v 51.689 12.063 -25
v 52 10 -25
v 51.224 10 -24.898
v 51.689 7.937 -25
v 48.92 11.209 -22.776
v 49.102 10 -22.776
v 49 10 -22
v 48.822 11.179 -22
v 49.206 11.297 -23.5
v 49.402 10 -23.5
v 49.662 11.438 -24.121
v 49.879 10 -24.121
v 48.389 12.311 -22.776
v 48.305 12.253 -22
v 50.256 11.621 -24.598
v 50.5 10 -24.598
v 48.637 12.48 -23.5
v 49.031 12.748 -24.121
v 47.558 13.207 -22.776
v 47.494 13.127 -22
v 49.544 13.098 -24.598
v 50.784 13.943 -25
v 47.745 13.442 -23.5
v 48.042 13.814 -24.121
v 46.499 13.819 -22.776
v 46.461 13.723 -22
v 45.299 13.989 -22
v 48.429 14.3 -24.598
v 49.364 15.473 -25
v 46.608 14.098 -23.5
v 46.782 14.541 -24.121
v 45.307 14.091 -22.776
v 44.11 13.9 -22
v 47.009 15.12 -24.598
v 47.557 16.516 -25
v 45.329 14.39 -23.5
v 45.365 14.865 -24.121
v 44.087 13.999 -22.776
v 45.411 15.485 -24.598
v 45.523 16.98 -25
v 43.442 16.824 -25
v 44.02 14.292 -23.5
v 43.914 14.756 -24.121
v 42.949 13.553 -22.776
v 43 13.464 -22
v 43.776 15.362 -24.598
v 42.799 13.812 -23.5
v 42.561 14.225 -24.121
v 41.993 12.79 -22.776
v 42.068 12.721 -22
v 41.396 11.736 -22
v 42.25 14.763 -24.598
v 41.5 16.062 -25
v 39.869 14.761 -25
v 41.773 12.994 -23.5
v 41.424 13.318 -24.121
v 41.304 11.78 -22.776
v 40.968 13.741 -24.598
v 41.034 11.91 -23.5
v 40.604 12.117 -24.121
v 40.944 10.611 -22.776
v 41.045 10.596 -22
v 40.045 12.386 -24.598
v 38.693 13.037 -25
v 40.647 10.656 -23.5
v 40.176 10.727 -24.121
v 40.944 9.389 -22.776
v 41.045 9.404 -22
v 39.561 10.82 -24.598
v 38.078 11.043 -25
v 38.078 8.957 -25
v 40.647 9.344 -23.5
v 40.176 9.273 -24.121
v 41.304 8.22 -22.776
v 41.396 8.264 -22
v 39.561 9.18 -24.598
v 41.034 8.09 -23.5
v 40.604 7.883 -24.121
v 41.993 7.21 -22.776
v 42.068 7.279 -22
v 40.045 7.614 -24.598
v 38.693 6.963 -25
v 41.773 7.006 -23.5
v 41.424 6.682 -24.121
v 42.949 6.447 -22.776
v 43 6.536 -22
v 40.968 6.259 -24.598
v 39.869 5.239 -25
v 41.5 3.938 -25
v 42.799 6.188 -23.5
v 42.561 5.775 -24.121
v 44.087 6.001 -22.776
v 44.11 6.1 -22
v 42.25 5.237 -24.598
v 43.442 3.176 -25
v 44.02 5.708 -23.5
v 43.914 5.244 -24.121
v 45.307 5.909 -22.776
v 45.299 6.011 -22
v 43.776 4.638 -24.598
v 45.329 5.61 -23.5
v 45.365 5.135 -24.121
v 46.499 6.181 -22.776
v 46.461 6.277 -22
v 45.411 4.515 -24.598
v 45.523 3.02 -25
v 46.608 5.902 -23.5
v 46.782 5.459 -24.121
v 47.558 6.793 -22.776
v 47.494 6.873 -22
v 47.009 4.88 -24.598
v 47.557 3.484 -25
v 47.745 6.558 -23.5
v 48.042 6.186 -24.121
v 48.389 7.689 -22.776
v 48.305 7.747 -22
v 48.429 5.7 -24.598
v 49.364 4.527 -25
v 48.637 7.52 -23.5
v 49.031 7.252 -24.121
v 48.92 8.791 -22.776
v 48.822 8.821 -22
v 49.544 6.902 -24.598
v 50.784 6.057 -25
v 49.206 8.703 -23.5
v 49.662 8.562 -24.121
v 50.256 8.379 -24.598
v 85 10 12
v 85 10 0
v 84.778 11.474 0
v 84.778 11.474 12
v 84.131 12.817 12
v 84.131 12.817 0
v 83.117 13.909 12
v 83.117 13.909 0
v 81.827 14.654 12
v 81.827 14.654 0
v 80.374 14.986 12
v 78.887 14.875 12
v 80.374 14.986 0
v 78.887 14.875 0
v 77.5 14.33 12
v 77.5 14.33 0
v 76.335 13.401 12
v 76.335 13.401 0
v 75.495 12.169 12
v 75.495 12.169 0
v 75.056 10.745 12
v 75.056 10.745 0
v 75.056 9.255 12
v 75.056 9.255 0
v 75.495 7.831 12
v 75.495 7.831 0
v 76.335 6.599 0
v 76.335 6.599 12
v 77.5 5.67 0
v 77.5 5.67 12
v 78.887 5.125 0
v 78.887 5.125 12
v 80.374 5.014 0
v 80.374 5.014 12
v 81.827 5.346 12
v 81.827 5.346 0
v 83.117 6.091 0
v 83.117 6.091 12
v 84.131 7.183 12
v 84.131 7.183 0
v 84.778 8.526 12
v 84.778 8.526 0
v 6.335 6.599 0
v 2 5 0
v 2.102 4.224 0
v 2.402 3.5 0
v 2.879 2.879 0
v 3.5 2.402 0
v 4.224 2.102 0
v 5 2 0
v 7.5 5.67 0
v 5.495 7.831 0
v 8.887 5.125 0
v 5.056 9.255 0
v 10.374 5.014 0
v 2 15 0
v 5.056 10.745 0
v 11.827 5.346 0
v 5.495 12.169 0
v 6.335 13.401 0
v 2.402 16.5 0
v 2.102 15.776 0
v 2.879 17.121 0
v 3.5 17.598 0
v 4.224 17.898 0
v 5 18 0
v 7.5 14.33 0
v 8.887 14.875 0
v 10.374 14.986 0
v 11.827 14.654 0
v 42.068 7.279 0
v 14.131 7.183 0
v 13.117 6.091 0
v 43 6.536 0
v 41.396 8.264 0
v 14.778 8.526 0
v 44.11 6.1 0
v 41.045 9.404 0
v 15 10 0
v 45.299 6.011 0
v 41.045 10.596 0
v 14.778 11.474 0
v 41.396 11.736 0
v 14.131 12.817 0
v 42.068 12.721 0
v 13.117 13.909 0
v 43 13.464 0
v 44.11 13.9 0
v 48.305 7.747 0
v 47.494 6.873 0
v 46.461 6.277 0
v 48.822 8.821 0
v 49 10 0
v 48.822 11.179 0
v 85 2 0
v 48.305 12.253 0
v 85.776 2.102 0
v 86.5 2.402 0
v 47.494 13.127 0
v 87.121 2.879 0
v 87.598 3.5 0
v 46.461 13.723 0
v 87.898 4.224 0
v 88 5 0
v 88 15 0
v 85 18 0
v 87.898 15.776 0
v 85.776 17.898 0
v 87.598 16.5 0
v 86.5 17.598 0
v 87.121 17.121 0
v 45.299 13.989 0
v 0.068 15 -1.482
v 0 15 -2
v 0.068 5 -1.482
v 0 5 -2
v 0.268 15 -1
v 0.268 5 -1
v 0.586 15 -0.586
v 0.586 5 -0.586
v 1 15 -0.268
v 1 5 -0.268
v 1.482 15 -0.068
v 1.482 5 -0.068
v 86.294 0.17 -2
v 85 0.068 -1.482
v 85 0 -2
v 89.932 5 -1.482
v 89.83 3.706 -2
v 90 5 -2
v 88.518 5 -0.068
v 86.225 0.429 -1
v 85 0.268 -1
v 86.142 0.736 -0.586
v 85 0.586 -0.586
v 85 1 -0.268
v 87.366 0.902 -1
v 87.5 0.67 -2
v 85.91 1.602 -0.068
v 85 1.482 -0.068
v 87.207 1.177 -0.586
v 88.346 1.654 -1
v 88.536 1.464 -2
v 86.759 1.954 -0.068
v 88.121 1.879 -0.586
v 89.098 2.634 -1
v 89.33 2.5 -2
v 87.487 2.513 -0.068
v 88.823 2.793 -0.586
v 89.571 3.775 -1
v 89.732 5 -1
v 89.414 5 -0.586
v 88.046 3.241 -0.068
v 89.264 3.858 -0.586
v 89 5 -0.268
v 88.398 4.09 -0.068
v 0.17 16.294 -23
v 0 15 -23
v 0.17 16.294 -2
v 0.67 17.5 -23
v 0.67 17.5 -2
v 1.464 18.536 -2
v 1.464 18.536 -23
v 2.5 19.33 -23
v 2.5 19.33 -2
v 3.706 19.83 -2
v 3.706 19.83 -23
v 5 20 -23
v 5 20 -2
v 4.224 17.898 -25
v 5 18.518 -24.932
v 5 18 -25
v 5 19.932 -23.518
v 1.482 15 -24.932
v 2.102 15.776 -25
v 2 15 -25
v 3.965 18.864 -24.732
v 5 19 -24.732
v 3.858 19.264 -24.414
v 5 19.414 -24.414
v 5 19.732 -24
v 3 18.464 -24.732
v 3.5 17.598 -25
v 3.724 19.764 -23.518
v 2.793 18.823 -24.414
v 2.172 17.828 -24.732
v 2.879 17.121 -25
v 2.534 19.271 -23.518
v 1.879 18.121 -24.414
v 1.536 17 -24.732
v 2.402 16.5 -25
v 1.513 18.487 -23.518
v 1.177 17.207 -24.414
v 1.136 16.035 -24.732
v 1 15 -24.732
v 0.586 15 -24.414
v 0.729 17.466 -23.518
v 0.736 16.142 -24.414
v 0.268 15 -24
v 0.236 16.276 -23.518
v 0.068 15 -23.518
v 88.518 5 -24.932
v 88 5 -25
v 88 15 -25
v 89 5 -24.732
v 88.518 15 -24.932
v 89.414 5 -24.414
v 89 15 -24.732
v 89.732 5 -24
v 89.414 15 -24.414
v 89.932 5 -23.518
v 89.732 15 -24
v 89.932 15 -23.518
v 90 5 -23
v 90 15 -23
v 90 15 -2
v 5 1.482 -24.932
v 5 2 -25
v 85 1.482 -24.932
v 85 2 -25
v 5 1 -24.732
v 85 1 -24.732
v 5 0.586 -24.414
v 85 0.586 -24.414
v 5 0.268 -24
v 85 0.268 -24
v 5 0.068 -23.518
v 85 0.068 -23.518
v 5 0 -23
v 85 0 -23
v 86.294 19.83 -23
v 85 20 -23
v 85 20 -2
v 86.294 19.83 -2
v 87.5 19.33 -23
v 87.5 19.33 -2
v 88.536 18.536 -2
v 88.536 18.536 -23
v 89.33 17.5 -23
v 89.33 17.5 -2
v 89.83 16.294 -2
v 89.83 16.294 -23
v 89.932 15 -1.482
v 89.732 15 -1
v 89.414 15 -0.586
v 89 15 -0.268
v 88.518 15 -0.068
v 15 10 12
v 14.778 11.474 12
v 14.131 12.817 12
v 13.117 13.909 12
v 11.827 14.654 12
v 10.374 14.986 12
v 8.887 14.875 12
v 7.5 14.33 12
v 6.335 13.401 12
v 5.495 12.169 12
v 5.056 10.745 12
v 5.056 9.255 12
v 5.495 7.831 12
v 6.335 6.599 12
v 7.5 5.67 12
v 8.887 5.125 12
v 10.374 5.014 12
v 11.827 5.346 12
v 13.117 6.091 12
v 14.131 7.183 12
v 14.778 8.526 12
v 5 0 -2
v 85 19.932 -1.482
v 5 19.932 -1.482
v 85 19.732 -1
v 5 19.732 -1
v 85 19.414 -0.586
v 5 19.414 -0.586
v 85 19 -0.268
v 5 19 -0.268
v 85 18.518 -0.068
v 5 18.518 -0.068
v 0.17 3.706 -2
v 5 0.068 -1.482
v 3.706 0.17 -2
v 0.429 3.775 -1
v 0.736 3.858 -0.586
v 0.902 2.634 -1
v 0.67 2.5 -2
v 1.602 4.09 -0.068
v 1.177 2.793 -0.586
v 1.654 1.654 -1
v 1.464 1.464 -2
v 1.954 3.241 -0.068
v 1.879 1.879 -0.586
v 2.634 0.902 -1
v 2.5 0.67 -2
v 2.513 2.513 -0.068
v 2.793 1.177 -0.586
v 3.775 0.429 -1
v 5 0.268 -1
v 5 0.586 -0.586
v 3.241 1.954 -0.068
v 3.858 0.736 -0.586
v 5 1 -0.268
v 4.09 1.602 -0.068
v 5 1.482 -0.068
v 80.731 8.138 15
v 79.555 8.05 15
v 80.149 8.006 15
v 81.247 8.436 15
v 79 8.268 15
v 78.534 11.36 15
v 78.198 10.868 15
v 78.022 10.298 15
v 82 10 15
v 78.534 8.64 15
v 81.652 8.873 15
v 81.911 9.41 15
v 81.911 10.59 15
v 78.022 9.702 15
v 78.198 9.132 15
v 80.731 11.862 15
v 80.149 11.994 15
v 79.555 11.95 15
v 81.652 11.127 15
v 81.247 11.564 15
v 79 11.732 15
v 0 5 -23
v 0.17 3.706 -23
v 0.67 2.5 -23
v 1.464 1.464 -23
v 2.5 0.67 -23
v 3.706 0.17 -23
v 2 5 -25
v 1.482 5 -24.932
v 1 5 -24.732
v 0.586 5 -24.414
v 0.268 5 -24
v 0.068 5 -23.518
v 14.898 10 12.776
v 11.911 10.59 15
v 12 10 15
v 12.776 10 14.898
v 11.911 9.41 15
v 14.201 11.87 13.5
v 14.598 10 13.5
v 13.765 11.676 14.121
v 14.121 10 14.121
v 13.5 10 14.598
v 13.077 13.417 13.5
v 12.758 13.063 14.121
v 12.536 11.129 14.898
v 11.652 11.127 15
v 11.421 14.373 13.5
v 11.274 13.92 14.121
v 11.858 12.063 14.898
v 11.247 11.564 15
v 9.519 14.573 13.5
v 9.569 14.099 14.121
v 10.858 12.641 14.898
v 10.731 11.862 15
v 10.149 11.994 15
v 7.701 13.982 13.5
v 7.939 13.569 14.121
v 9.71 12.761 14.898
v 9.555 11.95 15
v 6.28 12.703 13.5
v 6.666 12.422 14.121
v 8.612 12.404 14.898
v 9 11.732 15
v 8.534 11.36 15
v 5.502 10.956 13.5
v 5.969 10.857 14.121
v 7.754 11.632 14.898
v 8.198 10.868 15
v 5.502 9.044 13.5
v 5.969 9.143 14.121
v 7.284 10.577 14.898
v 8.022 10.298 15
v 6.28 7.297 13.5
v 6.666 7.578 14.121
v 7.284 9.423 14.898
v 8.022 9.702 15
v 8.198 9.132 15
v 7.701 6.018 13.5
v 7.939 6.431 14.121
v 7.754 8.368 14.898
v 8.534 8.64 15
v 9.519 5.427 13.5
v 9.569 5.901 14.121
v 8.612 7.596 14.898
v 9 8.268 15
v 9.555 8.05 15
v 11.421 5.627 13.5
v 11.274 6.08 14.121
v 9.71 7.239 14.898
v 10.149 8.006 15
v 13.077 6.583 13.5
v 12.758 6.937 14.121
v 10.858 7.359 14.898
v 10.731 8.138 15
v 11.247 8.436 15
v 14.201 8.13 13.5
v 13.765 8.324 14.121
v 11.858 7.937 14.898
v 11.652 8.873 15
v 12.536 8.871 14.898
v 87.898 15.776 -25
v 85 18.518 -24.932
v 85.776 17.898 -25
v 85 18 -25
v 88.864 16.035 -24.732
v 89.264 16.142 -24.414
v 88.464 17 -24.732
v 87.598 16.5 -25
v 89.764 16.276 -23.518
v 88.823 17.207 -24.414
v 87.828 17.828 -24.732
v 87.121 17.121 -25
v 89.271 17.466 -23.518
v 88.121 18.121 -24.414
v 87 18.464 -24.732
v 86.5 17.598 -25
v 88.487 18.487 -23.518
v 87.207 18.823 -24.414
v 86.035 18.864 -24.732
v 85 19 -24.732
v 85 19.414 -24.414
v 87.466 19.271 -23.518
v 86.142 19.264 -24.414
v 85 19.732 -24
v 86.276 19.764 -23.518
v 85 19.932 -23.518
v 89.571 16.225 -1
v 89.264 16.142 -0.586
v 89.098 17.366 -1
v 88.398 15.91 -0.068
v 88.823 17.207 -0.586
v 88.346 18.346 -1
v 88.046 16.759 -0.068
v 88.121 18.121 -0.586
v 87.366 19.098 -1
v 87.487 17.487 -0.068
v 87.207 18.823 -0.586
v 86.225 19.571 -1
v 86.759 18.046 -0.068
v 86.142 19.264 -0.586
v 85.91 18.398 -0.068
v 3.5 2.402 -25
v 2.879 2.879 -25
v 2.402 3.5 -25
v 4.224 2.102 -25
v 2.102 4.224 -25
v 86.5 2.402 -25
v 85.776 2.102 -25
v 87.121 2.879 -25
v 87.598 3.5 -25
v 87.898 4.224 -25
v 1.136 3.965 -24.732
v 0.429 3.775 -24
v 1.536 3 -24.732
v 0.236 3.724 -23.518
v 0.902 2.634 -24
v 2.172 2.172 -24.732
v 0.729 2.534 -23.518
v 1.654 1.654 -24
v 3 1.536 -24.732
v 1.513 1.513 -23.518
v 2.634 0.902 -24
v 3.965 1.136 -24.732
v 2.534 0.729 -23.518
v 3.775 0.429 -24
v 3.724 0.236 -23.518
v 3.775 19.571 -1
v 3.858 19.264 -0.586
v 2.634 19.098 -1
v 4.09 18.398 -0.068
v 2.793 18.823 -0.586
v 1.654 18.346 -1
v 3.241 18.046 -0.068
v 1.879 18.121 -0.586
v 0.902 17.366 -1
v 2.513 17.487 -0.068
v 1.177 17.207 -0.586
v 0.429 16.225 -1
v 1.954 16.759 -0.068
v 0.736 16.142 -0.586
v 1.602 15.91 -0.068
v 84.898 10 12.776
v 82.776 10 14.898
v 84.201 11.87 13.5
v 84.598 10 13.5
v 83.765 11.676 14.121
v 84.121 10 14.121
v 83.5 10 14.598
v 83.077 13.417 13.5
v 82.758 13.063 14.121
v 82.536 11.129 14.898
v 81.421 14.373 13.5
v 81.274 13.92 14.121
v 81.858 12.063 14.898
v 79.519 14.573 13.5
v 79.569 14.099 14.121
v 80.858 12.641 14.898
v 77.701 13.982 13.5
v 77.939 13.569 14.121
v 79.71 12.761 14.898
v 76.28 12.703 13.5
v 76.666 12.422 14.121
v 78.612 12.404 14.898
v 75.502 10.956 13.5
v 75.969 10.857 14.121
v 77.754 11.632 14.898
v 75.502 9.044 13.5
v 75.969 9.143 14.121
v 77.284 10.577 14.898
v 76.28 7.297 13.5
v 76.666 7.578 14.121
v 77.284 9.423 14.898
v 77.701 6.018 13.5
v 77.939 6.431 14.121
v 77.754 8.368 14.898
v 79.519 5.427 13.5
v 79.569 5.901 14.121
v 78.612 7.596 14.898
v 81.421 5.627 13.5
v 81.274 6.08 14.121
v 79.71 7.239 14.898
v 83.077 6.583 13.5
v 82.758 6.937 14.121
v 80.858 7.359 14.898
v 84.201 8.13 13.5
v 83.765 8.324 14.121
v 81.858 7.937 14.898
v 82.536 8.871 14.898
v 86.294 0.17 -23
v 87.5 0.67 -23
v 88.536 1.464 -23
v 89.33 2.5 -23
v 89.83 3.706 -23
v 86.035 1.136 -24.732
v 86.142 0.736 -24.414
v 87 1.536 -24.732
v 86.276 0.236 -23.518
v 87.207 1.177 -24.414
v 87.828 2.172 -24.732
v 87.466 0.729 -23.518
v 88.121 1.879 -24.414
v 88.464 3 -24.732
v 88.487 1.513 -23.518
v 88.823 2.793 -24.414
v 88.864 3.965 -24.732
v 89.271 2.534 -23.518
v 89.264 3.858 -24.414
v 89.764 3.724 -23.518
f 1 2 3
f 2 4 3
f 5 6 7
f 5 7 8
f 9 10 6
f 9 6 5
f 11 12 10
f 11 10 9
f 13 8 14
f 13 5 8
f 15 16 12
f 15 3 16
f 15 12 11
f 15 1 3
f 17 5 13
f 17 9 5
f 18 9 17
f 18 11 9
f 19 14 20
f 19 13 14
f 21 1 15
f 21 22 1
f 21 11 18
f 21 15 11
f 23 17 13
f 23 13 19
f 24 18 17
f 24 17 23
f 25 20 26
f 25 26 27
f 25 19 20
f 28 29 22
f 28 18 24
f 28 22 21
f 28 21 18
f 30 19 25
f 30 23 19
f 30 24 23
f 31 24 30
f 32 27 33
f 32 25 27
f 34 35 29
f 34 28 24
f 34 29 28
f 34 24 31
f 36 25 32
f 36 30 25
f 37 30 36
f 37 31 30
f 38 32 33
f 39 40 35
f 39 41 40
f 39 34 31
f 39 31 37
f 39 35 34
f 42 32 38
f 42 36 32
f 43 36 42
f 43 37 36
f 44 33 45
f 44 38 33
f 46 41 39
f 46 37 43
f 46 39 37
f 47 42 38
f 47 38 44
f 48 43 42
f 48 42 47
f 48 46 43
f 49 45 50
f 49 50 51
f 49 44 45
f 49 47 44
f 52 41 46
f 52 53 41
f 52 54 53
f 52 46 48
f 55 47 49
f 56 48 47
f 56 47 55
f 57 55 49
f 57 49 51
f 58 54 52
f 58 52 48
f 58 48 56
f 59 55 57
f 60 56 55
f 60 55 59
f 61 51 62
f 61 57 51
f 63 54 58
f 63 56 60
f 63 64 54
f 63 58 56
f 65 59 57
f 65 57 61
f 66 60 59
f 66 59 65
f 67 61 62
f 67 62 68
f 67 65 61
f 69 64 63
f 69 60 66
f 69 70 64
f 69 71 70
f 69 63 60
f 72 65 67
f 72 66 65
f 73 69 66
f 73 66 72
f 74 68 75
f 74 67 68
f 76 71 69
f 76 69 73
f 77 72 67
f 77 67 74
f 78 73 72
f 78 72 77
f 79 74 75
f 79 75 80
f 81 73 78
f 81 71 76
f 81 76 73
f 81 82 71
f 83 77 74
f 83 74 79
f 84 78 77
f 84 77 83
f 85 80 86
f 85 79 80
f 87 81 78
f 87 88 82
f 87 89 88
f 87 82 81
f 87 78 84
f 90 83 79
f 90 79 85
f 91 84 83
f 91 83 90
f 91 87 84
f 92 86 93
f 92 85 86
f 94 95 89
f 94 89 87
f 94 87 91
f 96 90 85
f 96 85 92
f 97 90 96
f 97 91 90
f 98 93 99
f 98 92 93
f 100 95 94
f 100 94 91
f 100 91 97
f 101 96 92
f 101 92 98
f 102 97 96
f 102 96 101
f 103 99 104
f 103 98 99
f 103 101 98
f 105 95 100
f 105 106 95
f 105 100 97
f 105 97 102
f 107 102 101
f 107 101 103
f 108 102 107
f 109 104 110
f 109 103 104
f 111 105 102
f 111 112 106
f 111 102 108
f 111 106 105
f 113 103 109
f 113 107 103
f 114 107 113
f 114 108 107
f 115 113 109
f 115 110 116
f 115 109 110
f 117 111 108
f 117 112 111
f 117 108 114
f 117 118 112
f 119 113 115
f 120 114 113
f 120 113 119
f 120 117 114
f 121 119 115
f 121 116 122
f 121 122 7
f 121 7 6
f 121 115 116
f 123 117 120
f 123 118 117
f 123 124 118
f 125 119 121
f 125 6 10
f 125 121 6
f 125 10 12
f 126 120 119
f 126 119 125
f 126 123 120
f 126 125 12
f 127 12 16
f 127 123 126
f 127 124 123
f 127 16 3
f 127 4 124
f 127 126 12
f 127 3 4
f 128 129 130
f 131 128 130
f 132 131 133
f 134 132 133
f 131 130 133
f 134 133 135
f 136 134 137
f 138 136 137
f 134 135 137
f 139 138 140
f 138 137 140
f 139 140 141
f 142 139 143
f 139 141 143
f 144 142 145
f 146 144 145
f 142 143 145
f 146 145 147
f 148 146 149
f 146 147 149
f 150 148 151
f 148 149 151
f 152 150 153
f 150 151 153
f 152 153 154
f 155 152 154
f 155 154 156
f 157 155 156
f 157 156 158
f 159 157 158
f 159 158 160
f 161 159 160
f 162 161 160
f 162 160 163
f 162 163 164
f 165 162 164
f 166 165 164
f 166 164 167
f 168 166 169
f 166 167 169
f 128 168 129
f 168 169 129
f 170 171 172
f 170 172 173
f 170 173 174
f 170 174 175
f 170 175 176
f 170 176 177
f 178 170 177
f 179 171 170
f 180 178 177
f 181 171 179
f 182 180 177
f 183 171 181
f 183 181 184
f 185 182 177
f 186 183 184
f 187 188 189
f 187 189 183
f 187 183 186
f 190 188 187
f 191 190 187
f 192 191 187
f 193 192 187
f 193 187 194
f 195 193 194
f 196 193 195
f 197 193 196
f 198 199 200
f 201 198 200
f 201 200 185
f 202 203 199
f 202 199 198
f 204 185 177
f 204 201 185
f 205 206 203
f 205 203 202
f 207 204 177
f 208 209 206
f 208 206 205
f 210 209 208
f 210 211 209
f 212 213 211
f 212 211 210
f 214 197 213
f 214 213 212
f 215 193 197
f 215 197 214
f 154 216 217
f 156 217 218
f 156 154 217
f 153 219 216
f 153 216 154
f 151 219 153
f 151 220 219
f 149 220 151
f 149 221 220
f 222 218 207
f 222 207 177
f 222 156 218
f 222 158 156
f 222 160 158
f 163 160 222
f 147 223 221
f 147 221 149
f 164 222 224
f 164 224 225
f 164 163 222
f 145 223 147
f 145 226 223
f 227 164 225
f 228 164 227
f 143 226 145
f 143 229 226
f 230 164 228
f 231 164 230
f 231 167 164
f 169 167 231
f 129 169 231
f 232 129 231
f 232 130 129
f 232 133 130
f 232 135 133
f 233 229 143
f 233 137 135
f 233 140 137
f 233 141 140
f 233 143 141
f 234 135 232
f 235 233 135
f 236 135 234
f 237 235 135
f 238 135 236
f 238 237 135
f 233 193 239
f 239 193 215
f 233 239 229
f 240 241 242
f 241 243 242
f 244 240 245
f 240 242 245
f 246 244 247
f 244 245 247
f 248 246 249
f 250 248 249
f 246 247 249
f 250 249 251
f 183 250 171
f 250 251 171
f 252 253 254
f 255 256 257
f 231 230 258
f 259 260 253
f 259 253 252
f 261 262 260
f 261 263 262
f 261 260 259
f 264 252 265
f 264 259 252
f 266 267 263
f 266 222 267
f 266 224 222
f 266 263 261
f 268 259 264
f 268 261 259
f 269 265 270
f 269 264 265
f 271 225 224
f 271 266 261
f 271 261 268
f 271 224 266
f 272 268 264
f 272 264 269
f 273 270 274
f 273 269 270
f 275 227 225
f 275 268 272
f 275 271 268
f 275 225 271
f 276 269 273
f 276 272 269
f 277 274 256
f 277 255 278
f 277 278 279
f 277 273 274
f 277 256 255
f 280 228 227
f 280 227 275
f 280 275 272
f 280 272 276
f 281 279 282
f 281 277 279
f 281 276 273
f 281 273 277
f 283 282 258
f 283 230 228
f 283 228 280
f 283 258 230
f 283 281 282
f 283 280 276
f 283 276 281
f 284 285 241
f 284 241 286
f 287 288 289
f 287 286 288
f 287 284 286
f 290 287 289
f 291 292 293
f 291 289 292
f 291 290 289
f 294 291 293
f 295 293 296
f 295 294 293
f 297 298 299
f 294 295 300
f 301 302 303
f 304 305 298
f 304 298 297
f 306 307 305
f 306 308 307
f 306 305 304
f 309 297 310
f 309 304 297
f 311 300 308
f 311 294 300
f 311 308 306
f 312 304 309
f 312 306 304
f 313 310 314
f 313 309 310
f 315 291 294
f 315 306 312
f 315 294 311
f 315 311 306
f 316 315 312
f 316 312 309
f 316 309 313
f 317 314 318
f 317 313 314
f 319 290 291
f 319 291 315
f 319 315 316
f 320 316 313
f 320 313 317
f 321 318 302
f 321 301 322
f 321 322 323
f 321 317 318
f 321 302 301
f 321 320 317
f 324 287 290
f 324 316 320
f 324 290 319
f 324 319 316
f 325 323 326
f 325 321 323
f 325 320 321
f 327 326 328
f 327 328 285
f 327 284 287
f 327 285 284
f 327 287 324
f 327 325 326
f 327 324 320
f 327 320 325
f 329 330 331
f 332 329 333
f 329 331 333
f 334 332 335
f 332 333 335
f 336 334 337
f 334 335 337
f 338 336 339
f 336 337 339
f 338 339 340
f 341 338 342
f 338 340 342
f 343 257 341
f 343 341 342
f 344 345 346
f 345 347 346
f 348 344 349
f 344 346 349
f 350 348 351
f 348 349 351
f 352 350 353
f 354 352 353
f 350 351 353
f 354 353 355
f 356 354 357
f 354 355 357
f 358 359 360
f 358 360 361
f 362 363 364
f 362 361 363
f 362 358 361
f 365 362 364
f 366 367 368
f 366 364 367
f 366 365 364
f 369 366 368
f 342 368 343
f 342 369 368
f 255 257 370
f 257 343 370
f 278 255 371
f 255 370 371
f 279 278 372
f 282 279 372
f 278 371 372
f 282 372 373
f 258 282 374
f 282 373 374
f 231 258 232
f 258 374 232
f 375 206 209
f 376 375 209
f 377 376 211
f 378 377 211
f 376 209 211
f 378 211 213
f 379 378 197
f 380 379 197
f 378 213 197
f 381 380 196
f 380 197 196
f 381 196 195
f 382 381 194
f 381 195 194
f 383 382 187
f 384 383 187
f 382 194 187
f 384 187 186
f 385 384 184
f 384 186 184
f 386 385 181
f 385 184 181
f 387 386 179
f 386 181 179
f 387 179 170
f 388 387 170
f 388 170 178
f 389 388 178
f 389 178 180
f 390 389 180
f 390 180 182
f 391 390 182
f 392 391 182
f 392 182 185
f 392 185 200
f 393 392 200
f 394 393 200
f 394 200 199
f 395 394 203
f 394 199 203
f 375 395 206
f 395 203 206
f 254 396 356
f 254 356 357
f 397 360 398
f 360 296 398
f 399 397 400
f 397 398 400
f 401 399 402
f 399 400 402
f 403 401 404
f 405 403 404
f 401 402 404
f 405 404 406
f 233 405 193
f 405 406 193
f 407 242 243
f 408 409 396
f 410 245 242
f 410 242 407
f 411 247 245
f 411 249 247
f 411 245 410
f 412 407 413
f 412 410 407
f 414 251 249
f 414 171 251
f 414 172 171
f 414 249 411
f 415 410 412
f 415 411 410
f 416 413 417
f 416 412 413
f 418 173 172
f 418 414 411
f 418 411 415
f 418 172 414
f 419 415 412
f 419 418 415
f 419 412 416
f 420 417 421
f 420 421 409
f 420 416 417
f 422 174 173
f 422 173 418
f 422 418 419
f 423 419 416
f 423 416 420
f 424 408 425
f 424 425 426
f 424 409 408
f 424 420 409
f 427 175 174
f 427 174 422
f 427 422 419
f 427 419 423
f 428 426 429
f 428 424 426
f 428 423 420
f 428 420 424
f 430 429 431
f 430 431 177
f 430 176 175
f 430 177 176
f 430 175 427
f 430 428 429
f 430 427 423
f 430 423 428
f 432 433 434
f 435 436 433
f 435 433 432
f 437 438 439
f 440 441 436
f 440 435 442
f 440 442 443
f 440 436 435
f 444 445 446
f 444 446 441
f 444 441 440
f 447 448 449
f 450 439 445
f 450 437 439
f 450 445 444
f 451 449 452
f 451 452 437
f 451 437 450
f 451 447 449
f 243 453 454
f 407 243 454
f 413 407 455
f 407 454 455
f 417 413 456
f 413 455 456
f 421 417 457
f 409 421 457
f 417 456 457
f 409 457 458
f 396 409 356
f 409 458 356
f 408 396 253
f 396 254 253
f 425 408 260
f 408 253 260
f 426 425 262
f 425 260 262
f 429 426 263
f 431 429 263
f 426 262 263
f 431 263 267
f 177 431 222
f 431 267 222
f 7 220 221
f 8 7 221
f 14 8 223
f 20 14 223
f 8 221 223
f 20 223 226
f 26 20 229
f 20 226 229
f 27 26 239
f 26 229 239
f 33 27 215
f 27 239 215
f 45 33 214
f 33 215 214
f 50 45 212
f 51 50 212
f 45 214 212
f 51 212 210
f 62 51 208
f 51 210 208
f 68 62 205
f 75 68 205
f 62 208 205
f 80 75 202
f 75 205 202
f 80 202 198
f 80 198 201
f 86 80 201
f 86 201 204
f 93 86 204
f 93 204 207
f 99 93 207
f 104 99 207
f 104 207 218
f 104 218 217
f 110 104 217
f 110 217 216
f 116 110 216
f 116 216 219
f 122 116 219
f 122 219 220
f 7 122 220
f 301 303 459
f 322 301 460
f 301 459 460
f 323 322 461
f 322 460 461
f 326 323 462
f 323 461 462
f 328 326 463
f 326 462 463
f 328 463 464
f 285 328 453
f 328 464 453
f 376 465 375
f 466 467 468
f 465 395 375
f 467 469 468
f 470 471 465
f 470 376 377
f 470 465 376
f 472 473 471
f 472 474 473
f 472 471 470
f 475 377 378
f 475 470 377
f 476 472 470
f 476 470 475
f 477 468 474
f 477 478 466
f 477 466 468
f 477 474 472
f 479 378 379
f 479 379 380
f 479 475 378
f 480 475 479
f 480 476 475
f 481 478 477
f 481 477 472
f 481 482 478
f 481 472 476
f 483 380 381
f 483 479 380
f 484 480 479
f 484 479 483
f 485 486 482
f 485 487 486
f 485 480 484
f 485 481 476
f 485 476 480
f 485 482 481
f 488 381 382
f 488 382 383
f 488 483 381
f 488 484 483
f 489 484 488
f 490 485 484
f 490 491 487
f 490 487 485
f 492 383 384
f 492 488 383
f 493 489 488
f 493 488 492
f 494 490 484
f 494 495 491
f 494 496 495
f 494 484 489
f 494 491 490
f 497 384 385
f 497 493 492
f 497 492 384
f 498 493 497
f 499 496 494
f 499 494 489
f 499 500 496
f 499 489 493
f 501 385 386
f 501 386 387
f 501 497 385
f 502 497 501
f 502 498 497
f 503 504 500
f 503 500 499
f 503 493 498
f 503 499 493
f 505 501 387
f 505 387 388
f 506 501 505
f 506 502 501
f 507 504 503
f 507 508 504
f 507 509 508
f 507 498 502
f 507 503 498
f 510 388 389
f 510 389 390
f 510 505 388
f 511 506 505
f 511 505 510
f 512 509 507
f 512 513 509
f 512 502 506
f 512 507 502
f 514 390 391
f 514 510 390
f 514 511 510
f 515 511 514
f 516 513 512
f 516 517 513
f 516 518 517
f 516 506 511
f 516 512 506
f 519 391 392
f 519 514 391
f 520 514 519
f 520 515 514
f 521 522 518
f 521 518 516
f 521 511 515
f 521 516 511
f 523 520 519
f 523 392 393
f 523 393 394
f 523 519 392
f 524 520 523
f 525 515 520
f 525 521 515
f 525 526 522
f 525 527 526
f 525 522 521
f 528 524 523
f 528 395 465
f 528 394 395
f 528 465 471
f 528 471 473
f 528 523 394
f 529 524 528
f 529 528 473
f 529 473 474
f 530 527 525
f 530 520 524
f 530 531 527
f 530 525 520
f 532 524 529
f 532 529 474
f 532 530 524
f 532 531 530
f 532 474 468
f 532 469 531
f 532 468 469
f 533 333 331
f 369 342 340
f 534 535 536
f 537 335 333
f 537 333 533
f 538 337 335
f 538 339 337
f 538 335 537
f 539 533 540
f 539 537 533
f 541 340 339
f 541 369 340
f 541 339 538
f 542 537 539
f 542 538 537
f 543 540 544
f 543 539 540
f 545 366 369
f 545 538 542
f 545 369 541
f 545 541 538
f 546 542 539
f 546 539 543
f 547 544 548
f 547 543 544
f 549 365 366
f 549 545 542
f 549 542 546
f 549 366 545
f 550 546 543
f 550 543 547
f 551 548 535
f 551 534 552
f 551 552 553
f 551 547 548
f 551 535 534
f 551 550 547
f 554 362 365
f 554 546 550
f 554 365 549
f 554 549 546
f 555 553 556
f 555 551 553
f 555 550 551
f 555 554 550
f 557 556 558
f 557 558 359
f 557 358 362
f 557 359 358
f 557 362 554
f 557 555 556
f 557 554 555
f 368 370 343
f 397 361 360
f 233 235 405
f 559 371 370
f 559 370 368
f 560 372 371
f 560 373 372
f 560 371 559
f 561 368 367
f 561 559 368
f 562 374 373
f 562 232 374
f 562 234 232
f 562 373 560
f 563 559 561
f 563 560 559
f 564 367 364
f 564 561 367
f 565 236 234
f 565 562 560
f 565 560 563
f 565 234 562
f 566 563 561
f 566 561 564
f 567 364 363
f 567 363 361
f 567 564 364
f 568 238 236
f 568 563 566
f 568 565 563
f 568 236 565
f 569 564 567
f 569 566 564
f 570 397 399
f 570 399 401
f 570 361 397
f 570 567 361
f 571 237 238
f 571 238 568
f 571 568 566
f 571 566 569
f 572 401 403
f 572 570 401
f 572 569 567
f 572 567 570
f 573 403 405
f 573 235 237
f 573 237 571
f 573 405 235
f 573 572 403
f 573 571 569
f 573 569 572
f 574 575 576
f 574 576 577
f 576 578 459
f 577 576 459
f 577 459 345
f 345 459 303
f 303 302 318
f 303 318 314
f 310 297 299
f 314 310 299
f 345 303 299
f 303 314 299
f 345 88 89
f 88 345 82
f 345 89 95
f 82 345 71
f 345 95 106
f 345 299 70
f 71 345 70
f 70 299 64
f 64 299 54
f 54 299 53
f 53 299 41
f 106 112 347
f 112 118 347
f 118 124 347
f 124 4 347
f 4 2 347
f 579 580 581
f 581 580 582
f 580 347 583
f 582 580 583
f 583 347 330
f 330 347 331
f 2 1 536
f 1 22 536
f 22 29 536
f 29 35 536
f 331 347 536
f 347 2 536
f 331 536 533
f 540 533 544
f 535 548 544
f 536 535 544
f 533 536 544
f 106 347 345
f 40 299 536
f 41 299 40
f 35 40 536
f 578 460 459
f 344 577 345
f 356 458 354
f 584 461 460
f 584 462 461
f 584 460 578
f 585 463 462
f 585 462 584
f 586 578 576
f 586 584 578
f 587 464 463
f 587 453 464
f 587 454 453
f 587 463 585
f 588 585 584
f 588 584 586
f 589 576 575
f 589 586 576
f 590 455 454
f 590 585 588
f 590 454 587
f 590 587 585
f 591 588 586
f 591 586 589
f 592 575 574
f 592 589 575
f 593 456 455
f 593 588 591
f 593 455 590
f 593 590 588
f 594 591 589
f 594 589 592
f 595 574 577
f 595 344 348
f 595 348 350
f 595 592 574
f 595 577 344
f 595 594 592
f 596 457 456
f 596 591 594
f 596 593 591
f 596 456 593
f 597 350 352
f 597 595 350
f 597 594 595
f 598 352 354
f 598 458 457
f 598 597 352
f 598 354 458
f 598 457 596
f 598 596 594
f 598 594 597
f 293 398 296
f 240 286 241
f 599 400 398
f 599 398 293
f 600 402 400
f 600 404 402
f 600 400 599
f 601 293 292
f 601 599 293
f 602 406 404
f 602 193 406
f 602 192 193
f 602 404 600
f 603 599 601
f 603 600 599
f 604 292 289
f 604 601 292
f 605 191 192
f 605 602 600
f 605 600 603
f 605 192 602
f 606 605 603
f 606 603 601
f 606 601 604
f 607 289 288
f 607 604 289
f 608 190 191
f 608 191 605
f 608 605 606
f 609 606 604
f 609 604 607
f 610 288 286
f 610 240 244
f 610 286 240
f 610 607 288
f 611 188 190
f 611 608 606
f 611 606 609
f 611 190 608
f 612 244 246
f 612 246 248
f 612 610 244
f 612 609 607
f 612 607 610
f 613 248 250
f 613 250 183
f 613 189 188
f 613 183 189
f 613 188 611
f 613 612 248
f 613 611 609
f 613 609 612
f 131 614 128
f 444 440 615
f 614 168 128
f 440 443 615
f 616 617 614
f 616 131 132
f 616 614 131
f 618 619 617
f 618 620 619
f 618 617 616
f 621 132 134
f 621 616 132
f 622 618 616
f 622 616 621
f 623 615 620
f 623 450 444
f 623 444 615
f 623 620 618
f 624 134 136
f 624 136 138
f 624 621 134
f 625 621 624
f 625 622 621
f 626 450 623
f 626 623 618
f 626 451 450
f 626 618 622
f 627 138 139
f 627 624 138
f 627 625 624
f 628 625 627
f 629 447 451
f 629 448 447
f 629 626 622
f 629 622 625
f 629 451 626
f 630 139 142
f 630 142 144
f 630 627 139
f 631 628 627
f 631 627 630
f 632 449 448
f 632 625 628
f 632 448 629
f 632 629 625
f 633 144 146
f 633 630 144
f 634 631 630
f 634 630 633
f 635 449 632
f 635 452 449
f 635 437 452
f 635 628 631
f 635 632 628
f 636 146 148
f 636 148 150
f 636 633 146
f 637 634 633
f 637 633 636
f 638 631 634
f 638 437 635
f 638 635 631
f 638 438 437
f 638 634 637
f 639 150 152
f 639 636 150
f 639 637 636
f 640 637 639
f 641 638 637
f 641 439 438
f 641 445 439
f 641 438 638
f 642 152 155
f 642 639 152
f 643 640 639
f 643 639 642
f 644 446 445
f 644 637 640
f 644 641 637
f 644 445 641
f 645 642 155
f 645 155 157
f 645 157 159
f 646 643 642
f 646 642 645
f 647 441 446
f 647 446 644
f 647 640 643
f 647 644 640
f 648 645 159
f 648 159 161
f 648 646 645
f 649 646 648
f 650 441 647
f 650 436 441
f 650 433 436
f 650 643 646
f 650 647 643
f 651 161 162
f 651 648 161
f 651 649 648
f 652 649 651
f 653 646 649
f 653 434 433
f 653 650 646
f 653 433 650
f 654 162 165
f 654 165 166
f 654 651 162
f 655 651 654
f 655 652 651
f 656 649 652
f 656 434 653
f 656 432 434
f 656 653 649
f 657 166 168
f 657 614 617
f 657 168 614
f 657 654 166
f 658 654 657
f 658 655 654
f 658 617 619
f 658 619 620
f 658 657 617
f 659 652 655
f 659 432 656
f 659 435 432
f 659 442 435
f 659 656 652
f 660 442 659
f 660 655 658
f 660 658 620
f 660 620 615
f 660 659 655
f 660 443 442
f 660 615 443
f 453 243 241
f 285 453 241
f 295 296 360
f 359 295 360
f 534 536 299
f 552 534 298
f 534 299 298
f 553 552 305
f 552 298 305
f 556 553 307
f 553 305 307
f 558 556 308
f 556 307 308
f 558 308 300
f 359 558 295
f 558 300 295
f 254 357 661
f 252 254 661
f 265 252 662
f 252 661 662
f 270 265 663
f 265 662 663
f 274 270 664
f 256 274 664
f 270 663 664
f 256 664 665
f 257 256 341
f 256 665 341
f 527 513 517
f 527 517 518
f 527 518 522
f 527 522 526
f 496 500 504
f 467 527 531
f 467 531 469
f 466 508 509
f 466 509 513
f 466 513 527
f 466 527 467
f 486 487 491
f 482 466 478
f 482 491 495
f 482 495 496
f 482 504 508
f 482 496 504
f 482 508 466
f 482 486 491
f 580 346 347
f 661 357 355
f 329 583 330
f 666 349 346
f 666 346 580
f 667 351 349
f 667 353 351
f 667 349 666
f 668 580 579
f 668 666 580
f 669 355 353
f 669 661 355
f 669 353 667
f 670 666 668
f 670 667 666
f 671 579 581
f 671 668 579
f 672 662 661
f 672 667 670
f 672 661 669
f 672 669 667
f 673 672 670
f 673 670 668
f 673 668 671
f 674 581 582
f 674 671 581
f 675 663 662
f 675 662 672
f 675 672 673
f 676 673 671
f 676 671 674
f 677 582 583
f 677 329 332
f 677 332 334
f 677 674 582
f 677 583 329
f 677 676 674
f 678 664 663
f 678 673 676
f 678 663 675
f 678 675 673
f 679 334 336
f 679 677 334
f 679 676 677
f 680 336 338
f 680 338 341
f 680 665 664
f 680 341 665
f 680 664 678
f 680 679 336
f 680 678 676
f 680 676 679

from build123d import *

# Parameters (mm, degrees)
F0_W     = 90
F0_H     = 20
F1_DEPTH = 25
F2_R     = 5
F3_DEPTH = 15
F4_R     = 4
F5_DEPTH = 25.001
F6_R     = 5
F7_R     = 3
F8_R     = 3
F9_R     = 2
F10_R    = 2


with BuildPart() as f1:
    # F0 (on Top) → F1 (new body)
    with BuildSketch(Plane.XY):
        with Locations((45, 10)):
            Rectangle(F0_W, F0_H)
    extrude(amount=-F1_DEPTH)

    # F2 (on Top) → F3 (join)
    with BuildSketch(Plane.XY):
        with Locations((10, 10)):
            Circle(F2_R)
        with Locations((80, 10)):
            Circle(F2_R)
    extrude(amount=F3_DEPTH)

    # F4 (on Top) → F5 (cut, through all)
    with BuildSketch(Plane.XY):
        with Locations((45, 10)):
            Circle(F4_R)
    extrude(amount=-F5_DEPTH, mode=Mode.SUBTRACT)

    # F6
    f6_edges = [f1.edges().sort_by_distance(p)[0] for p in [
        (0, 0, -12.5),
        (0, 20, -12.5),
        (90, 0, -12.5),
        (90, 20, -12.5),
    ]]
    fillet(f6_edges, radius=F6_R)

    # F7
    f7_edges = [f1.edges().sort_by_distance(p)[0] for p in [
        (5, 10, 15),
        (75, 10, 15),
    ]]
    fillet(f7_edges, radius=F7_R)

    # F8
    f8_edges = [f1.edges().sort_by_distance(p)[0] for p in [
        (41, 10, -25),
    ]]
    fillet(f8_edges, radius=F8_R)

    # F9
    f9_edges = [f1.edges().sort_by_distance(p)[0] for p in [
        (45, 0, -25),
    ]]
    fillet(f9_edges, radius=F9_R)

    # F10
    f10_edges = [f1.edges().sort_by_distance(p)[0] for p in [
        (45, 0, 0),
    ]]
    fillet(f10_edges, radius=F10_R)


solid = f1.part
